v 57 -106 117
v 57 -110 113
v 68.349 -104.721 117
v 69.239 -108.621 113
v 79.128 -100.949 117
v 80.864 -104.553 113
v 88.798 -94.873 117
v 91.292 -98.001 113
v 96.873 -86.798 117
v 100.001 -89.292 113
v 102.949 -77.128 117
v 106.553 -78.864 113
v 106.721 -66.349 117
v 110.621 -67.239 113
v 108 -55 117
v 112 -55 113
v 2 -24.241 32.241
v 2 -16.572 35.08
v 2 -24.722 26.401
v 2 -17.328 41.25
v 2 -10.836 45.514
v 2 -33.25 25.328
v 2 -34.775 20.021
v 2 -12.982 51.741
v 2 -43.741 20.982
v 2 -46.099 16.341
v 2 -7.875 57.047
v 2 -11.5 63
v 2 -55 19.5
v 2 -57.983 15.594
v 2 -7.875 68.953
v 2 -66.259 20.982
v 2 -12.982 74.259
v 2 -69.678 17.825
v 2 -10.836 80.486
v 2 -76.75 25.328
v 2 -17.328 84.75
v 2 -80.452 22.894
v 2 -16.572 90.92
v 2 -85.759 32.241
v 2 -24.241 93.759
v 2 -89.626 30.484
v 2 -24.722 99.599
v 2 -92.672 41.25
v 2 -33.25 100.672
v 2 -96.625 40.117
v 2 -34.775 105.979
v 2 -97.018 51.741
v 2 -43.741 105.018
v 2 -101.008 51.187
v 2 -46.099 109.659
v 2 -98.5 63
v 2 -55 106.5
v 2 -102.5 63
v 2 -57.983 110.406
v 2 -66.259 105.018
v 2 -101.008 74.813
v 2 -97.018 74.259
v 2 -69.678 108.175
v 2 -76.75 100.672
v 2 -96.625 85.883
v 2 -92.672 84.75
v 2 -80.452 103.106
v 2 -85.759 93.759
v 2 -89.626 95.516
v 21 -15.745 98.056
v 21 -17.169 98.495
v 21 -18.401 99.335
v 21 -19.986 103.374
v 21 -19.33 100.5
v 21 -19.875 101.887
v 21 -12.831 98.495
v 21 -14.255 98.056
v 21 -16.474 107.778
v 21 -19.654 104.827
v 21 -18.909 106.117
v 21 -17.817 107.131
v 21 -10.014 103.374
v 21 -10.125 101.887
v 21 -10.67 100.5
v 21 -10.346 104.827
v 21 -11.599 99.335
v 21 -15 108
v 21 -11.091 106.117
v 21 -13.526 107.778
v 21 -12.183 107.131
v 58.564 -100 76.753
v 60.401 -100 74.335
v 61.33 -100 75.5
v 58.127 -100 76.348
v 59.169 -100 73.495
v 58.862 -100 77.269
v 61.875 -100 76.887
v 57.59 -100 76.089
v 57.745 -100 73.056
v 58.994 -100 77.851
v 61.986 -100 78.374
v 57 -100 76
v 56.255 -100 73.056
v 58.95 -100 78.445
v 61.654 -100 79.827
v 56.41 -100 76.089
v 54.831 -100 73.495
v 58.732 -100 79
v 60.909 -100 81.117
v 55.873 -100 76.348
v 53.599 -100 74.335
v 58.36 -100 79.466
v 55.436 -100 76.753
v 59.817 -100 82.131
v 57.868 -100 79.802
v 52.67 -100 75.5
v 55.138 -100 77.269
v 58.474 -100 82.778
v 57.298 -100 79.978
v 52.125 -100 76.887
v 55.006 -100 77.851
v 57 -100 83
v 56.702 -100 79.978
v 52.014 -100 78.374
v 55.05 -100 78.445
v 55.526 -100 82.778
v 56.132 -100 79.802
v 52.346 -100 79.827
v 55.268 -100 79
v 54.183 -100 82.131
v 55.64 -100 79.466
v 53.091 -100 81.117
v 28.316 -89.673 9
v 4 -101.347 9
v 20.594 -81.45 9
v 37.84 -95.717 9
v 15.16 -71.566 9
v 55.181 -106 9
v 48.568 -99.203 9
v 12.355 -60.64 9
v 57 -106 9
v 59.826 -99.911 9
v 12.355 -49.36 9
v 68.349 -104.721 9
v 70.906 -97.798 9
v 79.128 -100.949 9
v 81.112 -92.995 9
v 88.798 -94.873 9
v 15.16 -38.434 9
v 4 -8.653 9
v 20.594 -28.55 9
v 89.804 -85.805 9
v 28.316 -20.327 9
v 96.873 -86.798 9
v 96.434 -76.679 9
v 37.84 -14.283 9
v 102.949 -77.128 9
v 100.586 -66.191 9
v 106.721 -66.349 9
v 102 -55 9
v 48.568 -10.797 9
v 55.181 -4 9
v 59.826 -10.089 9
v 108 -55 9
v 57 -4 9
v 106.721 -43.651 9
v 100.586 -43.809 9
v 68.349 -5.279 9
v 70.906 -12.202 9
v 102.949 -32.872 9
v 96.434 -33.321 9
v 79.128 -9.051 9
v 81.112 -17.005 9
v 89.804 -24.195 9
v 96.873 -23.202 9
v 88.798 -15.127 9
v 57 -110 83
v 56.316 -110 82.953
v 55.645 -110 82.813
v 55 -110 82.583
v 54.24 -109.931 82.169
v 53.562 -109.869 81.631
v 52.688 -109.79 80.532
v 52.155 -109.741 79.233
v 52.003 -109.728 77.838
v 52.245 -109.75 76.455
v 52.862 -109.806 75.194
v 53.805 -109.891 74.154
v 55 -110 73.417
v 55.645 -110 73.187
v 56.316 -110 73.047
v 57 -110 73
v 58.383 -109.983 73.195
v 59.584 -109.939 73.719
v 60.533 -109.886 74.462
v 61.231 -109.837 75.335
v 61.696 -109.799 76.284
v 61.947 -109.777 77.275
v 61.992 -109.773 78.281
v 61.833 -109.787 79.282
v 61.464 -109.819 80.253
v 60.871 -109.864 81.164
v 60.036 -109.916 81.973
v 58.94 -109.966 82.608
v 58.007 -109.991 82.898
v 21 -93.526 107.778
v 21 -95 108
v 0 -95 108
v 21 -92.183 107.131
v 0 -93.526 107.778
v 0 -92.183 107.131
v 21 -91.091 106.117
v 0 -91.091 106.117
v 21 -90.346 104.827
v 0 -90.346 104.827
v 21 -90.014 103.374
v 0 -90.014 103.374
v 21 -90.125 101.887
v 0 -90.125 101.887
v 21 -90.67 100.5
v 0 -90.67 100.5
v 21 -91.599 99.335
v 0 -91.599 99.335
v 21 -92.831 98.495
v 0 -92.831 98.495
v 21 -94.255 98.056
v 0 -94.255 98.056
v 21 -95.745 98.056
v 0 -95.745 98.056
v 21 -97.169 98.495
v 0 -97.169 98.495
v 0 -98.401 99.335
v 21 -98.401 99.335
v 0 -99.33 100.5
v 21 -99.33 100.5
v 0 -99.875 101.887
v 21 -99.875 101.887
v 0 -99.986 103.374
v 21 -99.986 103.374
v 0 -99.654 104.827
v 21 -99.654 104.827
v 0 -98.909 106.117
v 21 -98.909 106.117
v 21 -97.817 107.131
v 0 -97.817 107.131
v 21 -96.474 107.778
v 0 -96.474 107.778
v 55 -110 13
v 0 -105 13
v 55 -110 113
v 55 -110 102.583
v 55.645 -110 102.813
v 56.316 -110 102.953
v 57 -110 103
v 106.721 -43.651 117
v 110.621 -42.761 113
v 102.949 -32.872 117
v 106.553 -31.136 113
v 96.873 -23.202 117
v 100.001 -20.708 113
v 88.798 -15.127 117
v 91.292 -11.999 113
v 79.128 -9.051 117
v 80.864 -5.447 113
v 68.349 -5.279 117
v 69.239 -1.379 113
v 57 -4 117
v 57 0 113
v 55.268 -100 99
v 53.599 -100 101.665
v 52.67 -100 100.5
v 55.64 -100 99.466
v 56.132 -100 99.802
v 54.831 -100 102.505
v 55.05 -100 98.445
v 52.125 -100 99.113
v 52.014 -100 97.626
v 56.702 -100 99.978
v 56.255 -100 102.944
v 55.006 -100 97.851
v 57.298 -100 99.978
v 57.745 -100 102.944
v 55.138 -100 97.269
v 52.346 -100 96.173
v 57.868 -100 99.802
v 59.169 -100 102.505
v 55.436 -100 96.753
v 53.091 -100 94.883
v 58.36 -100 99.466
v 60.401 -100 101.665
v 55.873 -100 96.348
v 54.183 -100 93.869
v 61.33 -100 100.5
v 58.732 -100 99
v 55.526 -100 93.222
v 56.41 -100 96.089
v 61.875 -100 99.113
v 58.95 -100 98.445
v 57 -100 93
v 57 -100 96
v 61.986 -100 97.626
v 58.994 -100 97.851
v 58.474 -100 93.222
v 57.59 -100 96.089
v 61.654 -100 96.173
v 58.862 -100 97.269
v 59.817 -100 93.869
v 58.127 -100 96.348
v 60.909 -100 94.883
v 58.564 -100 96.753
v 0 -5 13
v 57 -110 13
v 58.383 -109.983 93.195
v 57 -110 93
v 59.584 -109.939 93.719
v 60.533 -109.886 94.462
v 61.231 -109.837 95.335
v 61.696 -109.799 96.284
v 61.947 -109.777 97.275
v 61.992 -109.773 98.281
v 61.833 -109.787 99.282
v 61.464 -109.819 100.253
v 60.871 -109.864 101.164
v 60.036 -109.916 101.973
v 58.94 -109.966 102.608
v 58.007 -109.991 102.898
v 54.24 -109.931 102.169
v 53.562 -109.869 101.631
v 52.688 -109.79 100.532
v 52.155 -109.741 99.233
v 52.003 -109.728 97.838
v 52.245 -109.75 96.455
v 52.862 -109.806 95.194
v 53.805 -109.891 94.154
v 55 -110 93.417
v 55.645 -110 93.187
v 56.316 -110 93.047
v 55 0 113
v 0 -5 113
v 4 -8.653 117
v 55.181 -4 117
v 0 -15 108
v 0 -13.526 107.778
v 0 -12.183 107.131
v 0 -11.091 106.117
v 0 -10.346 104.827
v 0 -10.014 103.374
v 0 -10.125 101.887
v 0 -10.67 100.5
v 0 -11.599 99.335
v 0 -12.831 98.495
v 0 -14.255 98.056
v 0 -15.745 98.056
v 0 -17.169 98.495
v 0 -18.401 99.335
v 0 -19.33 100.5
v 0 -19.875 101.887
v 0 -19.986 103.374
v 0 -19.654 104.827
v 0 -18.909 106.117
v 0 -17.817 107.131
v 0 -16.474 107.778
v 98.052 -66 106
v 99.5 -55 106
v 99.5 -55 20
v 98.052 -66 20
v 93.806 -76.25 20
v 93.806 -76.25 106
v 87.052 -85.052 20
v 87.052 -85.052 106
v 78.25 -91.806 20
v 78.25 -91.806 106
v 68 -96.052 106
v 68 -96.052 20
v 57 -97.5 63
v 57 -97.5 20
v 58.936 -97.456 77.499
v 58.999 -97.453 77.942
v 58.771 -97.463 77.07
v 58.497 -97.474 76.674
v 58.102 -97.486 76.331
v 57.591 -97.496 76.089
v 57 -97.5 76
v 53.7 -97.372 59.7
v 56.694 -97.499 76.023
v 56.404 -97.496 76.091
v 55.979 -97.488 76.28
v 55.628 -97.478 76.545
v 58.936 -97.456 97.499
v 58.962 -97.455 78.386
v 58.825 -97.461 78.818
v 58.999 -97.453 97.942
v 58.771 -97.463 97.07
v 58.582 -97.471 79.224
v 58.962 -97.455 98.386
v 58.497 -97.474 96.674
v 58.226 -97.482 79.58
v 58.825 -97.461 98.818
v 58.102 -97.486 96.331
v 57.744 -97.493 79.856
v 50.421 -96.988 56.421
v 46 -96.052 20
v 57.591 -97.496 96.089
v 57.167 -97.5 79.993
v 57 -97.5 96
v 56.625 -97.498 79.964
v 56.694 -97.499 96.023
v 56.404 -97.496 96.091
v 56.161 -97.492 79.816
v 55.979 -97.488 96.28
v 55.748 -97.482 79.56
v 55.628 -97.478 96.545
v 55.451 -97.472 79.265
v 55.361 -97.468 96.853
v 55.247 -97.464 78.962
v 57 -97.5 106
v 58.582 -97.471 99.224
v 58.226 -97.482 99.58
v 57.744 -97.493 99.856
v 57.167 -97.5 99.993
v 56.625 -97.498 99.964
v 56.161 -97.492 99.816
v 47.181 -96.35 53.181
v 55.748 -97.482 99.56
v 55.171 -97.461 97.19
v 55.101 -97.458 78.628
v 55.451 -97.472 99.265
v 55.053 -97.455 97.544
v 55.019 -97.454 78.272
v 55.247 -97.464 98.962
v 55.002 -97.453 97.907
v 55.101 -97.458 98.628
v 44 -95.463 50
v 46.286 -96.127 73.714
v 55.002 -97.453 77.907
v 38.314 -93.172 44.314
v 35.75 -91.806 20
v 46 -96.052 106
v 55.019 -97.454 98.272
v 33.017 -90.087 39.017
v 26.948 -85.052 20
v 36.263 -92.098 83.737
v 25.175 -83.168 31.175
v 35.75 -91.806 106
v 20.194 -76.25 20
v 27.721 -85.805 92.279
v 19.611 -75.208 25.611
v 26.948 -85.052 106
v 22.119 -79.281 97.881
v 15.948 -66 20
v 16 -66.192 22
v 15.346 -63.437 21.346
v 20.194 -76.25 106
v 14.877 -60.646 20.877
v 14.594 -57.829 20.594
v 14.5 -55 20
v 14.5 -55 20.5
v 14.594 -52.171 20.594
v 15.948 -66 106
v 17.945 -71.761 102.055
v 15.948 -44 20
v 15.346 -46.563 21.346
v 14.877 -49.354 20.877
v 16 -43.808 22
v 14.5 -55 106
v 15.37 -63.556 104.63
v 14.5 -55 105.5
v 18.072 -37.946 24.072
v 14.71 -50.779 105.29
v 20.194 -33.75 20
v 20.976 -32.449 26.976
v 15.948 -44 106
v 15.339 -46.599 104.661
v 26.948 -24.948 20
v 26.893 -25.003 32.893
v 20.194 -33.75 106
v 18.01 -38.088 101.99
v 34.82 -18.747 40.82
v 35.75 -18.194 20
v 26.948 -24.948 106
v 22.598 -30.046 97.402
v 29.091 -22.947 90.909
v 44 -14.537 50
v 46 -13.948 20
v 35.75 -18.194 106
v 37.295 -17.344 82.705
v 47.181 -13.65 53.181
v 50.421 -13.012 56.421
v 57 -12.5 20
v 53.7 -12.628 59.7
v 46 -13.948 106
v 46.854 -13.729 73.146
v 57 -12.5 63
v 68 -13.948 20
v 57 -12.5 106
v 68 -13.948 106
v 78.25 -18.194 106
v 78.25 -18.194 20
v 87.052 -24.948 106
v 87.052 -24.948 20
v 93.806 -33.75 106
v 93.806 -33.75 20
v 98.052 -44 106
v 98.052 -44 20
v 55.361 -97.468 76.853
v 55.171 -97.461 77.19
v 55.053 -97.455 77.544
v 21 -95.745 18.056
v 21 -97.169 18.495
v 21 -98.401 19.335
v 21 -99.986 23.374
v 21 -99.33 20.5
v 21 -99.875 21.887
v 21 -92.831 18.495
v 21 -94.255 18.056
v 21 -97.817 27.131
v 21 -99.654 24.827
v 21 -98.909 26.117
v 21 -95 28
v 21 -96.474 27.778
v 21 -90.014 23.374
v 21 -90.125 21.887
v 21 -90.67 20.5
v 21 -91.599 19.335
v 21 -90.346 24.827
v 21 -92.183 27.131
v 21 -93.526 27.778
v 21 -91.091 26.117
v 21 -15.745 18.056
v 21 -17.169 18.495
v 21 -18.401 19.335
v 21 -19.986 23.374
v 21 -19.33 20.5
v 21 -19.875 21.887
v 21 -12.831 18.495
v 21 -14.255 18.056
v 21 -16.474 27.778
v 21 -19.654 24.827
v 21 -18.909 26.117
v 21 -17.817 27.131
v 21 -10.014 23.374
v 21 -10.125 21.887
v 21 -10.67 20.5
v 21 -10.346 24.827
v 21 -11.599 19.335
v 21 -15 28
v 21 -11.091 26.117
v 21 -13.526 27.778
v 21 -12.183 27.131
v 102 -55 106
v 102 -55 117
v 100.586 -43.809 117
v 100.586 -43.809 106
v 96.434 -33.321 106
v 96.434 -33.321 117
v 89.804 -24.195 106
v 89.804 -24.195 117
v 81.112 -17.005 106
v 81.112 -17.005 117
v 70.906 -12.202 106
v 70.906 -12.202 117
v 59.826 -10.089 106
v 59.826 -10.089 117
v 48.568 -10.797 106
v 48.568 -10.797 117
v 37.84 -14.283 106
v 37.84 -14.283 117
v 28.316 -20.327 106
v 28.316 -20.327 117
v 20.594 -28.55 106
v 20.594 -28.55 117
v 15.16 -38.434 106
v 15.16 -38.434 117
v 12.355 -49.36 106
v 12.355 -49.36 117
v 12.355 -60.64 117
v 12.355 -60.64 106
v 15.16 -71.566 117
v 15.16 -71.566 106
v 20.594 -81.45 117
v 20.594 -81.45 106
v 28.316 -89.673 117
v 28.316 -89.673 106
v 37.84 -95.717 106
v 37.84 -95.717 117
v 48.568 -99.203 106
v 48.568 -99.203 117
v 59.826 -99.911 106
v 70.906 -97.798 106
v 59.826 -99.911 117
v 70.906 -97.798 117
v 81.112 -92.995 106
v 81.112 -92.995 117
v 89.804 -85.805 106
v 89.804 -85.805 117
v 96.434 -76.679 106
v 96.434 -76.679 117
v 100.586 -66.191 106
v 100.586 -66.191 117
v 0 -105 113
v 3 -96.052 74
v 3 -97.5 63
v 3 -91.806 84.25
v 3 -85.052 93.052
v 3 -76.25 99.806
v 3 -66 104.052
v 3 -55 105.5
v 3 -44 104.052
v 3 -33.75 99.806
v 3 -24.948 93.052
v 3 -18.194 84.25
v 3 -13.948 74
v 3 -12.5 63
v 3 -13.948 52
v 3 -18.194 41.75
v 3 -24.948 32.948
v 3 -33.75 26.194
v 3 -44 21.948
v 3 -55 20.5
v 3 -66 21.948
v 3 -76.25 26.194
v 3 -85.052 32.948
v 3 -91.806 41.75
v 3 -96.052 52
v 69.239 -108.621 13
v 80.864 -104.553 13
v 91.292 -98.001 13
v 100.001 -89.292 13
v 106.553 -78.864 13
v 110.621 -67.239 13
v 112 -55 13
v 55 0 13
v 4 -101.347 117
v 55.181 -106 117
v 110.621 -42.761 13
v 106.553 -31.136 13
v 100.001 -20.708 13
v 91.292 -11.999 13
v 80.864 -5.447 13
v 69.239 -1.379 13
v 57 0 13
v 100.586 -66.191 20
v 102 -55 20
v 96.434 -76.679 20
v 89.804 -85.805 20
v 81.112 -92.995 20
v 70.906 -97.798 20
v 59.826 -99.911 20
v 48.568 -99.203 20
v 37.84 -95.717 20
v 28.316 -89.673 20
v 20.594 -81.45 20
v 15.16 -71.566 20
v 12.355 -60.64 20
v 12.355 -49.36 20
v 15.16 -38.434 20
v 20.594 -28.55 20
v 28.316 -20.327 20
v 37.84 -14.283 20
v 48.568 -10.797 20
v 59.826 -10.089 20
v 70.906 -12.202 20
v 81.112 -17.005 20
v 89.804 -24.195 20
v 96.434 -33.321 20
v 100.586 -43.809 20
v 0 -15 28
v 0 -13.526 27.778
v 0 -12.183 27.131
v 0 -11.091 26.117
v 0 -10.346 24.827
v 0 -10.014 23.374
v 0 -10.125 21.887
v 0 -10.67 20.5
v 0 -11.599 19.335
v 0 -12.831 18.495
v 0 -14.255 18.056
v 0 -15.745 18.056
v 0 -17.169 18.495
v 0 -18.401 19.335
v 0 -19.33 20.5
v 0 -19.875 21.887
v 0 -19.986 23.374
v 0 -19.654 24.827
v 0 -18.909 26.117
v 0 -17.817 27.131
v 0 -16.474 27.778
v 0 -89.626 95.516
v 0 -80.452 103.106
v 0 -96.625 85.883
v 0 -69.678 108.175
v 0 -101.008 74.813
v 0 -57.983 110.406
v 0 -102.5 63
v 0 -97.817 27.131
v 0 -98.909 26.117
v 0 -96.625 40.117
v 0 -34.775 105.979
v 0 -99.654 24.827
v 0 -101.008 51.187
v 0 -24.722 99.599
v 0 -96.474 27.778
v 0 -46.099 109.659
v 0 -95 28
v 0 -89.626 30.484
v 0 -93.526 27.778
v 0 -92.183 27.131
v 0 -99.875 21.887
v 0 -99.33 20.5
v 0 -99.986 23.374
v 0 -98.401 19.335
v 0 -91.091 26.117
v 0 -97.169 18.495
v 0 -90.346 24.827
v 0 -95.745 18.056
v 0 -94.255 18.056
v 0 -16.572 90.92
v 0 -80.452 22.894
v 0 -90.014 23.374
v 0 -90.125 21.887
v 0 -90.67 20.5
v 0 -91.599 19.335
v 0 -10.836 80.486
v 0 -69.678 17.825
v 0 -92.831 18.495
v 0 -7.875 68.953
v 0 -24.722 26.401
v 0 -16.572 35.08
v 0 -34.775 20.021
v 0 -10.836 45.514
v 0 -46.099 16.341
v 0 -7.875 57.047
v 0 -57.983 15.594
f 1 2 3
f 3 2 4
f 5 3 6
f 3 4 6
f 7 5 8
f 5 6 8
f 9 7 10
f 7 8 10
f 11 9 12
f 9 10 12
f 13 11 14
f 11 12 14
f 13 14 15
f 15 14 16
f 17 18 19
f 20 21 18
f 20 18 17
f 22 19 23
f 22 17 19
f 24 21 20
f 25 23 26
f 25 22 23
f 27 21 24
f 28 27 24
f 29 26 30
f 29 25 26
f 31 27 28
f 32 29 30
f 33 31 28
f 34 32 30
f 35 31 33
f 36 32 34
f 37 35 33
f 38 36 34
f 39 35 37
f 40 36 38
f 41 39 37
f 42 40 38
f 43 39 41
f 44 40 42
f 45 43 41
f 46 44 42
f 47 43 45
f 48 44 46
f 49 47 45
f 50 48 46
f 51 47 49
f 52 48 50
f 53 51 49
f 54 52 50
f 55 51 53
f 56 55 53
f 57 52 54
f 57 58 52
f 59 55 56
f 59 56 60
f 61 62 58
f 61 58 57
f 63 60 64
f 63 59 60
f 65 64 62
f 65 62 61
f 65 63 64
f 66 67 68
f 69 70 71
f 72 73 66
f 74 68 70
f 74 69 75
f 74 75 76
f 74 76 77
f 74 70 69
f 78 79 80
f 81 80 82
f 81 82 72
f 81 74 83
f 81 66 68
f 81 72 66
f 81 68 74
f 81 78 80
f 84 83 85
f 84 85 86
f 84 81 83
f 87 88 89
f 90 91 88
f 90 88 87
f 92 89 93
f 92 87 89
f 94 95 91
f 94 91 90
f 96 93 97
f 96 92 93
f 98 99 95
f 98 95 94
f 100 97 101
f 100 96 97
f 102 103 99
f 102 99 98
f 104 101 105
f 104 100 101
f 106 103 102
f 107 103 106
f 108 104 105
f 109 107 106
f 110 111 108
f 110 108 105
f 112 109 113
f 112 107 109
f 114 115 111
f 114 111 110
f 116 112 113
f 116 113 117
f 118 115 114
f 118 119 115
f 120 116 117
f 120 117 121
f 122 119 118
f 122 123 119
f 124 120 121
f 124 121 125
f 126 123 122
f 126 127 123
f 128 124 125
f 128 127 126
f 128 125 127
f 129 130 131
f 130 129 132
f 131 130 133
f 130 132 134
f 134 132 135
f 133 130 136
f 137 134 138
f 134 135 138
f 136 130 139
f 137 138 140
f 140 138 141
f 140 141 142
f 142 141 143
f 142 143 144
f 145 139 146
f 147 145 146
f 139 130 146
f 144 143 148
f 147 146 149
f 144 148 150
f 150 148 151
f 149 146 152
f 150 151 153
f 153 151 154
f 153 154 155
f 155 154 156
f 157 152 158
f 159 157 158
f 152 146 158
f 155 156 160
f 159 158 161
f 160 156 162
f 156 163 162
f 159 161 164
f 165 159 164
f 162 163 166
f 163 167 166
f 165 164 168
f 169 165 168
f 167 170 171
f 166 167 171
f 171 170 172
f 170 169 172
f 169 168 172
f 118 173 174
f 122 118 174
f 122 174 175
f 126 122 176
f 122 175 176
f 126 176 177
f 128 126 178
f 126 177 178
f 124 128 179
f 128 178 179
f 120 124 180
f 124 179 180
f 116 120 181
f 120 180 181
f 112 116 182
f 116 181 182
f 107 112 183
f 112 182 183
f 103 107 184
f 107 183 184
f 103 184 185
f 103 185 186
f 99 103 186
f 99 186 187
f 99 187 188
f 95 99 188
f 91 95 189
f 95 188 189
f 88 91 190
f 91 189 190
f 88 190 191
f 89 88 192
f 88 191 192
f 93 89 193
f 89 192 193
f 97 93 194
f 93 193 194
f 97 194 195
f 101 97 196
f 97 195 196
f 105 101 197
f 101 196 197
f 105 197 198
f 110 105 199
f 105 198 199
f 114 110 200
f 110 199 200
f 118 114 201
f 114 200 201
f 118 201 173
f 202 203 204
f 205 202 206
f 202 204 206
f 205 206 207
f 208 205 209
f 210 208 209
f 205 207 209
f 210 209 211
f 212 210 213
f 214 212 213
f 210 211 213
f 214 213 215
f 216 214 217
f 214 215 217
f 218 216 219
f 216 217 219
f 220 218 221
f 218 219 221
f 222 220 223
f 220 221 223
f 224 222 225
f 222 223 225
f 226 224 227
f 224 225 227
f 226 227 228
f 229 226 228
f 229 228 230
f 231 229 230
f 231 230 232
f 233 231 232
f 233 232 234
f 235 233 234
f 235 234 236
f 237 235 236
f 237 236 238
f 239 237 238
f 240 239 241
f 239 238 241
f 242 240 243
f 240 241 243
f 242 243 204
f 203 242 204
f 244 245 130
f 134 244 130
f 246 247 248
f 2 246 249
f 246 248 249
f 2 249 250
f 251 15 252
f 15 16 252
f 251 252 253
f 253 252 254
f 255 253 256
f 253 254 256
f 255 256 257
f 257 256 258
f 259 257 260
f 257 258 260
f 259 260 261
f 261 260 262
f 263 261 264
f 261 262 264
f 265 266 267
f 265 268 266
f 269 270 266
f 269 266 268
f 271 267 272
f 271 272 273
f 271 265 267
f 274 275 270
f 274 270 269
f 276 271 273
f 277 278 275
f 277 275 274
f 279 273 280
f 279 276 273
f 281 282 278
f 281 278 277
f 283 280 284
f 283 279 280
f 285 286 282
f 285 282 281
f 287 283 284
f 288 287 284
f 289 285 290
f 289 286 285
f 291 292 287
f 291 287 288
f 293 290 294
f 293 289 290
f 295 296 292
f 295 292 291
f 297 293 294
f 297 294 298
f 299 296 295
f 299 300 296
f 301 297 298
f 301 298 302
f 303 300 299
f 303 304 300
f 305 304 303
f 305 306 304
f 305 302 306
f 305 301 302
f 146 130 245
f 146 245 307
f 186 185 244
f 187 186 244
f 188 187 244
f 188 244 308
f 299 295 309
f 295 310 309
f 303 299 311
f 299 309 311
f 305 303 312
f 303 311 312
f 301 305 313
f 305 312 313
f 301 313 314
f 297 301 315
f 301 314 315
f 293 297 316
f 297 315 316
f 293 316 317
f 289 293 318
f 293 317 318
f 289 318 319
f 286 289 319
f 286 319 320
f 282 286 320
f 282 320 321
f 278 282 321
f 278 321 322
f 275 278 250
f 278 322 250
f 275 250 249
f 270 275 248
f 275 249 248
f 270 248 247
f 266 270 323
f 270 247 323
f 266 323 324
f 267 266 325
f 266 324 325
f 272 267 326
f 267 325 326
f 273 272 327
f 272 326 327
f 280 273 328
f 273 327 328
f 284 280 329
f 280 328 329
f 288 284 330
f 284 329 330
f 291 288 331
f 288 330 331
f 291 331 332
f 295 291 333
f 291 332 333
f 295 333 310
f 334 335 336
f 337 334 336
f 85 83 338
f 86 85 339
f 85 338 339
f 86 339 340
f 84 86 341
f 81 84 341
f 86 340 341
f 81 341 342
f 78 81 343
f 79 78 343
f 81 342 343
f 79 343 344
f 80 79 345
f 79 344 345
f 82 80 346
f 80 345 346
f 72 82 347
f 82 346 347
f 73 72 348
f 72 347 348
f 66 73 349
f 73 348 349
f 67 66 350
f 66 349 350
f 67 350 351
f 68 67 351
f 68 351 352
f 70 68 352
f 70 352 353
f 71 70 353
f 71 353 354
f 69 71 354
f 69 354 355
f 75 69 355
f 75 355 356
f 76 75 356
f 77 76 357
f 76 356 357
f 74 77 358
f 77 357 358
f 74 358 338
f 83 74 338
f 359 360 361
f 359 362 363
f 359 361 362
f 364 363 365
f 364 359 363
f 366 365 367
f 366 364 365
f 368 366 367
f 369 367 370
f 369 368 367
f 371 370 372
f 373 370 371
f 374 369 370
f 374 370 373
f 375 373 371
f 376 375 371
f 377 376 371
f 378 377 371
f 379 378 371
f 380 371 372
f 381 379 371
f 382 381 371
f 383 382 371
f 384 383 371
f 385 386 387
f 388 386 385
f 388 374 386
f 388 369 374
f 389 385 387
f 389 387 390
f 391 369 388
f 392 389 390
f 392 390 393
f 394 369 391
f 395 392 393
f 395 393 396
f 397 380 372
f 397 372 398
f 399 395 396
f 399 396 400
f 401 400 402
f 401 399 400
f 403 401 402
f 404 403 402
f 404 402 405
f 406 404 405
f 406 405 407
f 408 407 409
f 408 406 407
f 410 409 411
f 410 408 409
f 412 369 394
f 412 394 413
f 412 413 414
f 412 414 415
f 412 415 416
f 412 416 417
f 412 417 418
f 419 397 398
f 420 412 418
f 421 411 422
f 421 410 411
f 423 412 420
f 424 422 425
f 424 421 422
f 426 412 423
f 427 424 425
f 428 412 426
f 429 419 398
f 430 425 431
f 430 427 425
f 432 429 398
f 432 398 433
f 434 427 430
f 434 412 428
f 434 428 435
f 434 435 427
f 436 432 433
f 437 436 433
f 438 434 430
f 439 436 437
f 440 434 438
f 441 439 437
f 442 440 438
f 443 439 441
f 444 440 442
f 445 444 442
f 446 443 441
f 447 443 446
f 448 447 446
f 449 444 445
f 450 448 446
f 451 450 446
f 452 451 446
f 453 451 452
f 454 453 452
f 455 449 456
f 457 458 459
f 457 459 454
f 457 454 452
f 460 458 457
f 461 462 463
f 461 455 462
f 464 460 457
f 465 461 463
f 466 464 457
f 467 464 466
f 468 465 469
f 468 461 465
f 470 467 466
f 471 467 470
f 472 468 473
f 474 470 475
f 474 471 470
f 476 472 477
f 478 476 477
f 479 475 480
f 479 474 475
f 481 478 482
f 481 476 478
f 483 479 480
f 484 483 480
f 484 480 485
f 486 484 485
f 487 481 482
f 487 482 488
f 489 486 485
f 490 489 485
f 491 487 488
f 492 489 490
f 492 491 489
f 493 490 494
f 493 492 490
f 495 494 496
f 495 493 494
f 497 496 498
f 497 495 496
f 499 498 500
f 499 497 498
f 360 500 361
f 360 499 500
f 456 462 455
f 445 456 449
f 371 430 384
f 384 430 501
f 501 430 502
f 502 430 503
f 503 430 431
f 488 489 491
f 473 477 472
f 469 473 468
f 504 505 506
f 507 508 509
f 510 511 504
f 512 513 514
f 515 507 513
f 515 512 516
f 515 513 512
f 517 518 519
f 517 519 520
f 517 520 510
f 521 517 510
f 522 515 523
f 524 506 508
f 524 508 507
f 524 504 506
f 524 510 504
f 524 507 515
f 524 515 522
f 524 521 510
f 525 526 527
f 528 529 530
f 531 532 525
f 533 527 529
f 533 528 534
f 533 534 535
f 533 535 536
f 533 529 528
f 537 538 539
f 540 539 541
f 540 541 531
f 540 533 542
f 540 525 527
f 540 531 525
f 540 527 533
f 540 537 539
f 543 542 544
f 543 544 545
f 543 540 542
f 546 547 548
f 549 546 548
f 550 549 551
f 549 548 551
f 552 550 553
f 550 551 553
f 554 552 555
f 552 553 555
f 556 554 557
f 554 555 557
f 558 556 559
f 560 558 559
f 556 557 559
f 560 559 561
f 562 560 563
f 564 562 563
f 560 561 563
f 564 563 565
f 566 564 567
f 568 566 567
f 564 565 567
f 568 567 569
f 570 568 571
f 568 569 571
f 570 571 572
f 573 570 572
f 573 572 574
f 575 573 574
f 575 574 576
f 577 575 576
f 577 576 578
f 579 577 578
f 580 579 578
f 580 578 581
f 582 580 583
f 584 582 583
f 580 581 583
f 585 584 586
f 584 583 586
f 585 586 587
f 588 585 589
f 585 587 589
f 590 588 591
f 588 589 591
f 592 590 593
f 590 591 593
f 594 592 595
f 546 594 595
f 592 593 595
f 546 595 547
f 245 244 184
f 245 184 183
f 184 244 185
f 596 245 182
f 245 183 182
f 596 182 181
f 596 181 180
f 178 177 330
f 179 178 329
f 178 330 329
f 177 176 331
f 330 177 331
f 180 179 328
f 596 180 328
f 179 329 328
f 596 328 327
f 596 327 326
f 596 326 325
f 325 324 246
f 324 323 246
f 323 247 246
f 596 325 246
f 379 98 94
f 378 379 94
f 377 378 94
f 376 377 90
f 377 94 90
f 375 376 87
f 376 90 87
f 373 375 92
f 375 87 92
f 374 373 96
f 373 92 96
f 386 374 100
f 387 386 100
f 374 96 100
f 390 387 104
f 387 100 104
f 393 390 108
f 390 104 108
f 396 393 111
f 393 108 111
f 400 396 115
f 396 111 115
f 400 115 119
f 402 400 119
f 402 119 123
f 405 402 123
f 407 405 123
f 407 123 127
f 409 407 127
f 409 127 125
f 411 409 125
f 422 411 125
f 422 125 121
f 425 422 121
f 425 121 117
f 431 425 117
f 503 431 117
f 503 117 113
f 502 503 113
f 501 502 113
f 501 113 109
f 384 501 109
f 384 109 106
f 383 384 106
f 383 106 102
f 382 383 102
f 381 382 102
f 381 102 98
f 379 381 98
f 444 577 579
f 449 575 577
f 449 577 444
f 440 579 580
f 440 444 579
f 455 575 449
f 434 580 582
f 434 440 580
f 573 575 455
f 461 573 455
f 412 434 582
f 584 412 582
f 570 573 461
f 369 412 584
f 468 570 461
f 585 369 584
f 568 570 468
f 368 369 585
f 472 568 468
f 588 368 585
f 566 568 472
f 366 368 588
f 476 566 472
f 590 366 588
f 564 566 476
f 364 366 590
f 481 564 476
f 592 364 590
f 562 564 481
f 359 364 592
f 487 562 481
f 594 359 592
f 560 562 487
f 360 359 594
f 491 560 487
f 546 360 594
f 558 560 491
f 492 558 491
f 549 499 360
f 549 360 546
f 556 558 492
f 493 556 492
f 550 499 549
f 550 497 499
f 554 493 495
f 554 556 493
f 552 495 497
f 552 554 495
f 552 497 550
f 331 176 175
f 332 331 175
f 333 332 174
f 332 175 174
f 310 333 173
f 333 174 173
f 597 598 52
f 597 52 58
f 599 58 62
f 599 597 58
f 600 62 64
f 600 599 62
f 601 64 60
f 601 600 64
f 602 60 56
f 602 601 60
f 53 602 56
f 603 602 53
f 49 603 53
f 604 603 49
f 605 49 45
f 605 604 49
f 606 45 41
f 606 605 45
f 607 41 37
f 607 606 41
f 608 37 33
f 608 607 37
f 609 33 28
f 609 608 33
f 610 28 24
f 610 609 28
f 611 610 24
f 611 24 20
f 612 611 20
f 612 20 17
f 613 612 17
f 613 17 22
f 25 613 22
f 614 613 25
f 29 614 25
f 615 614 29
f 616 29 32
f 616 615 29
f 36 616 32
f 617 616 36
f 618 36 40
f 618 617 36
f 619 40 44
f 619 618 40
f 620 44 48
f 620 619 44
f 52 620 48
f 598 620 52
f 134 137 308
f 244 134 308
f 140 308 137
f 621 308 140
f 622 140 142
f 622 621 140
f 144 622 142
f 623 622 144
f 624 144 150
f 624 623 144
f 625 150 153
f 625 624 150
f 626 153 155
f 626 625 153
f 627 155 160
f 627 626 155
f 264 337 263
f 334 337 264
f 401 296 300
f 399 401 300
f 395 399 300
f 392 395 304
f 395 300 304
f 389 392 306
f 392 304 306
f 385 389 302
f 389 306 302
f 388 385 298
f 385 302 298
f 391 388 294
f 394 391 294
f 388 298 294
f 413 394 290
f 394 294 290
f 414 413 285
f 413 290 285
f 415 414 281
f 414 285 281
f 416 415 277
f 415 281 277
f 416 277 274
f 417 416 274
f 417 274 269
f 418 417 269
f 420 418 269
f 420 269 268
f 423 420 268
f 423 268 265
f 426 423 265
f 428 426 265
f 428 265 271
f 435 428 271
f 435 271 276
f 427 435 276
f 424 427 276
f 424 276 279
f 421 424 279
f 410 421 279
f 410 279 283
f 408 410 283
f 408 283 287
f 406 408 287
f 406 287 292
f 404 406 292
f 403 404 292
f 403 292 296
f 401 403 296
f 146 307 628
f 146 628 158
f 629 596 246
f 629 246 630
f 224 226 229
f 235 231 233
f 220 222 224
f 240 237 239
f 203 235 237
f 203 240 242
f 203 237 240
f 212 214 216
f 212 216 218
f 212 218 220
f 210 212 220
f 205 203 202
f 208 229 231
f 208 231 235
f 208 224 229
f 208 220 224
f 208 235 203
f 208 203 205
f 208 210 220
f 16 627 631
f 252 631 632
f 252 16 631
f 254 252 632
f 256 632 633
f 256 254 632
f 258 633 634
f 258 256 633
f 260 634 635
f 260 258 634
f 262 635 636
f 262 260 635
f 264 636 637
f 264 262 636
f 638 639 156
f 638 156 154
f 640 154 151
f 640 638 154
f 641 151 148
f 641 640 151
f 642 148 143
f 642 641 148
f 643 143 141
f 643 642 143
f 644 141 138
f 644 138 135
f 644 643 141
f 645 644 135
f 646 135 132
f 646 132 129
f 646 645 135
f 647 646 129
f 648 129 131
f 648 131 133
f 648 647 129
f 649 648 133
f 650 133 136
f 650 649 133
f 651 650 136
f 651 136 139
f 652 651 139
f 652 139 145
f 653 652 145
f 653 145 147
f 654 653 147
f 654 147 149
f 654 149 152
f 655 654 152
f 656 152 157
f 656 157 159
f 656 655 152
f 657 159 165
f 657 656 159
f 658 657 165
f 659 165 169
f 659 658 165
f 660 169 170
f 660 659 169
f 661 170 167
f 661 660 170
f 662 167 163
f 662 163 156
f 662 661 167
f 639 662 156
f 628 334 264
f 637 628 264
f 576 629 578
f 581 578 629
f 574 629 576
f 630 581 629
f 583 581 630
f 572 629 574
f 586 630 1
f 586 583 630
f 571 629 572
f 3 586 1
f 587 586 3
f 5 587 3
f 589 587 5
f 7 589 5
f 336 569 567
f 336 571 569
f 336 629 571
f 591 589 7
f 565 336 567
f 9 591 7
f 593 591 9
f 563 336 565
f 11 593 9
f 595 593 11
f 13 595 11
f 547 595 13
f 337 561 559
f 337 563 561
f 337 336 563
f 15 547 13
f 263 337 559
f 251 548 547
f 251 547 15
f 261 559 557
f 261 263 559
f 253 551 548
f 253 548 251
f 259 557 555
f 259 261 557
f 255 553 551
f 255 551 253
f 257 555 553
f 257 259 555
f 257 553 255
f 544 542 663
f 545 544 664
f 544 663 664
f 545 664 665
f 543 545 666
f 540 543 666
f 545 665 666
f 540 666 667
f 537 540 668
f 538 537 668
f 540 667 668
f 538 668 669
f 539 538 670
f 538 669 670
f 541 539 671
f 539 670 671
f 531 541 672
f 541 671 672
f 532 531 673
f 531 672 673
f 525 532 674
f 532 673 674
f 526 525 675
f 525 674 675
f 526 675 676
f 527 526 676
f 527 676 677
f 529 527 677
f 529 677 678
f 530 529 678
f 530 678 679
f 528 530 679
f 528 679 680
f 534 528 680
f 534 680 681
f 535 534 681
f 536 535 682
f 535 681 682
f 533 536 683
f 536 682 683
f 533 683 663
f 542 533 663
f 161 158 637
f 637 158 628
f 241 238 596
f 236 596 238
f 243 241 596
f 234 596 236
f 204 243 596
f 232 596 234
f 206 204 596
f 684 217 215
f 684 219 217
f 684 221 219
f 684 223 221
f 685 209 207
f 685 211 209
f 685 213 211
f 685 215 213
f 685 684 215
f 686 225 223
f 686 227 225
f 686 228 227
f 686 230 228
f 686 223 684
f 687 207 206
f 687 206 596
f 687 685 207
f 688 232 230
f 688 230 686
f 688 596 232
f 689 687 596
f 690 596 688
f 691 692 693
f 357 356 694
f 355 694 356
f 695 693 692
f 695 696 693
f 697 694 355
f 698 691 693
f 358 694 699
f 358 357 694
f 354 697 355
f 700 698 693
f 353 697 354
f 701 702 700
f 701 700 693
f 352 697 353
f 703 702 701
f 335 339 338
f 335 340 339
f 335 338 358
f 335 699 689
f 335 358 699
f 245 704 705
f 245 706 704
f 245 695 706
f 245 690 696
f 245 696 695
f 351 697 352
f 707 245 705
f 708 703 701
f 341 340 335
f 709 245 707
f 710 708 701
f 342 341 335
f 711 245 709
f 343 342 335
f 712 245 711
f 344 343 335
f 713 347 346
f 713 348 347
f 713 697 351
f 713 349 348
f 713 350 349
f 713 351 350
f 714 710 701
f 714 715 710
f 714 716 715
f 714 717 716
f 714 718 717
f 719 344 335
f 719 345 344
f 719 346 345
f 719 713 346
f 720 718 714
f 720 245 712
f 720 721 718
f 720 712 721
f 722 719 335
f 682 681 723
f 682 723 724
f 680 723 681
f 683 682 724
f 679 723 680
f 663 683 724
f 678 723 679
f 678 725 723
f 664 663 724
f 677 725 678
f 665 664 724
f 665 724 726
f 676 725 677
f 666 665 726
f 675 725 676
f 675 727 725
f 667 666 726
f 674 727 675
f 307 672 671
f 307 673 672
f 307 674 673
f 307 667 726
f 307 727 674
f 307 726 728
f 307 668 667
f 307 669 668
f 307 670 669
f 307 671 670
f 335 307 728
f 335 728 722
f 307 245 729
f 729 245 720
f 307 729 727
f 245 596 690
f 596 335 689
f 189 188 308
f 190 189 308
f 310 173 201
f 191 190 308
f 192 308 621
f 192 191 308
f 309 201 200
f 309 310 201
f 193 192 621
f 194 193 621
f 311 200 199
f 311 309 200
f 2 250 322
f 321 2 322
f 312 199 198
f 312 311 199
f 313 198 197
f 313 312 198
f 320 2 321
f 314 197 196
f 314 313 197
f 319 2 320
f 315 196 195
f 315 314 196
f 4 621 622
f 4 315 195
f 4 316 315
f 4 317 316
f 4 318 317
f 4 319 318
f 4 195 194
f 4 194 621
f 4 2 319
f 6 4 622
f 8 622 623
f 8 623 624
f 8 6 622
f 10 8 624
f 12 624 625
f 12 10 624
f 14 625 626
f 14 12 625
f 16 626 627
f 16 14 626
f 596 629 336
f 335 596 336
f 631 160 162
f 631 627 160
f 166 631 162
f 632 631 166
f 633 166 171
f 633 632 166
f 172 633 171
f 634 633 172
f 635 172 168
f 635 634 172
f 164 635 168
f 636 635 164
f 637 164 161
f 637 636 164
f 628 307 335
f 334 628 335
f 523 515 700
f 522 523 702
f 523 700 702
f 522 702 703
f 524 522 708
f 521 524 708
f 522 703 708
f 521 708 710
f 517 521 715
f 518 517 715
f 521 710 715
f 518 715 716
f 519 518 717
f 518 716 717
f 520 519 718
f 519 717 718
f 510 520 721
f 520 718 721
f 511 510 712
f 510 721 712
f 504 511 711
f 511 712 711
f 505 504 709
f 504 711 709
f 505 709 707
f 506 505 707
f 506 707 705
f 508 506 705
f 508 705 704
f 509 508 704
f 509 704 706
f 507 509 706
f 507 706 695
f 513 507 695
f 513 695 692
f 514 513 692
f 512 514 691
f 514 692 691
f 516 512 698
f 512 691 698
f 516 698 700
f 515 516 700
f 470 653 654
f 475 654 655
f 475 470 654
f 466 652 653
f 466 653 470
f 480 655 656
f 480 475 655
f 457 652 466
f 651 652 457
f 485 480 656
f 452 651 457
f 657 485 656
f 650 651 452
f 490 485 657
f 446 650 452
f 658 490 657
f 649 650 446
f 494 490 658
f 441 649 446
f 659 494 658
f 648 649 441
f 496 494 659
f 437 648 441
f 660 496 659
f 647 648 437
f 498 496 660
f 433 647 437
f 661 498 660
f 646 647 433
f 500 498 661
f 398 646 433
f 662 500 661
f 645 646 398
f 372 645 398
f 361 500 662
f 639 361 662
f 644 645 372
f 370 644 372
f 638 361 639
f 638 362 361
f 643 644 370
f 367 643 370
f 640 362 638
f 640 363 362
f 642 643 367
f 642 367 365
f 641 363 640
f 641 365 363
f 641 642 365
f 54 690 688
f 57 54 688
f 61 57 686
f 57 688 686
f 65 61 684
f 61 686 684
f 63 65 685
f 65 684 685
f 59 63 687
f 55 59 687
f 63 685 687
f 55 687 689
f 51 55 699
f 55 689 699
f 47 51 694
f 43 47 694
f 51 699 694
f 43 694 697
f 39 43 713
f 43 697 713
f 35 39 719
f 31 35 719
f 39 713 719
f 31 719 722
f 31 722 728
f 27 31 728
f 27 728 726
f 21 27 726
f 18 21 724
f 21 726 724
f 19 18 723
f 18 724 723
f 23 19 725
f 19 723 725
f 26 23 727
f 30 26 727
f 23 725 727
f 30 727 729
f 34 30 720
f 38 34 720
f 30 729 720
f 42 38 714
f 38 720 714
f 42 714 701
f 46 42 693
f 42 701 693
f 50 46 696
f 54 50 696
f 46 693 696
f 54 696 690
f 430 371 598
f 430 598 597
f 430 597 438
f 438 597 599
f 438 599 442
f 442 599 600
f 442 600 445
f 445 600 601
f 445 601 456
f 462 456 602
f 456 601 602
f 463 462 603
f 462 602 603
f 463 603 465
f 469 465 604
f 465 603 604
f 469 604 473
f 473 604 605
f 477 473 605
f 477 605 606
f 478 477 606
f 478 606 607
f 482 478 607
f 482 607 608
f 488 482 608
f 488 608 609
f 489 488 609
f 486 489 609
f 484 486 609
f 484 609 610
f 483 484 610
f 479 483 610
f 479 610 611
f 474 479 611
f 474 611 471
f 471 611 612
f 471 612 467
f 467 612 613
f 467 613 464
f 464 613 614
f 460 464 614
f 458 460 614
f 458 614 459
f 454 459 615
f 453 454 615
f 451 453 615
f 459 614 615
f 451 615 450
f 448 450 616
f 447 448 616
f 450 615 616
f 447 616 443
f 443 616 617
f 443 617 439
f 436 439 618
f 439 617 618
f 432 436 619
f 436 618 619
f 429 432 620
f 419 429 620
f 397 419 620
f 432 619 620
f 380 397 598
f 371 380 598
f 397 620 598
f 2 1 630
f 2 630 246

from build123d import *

# Parameters (mm, degrees)
SKETCH_1_W           = 112
SKETCH_1_H           = 110
EXTRUDE_1_DEPTH      = 126
FILLET_1_R           = 55
SKETCH_9_R           = 42.5
CUT_EXTRUDE_5_DEPTH  = 104
SKETCH_10_R          = 42.5
CUT_EXTRUDE_6_DEPTH  = 57
CUT_EXTRUDE_START    = -50
SKETCH_11_R          = 42.5
CUT_EXTRUDE_7_DEPTH  = 50
CHAMFER_1_SIZE       = 55
CHAMFER_1_SIZE2      = 5
CHAMFER_2_SIZE       = 5
CHAMFER_2_SIZE2      = 55
SKETCH_14_W          = 143.089430894
SKETCH_14_H          = 9
CUT_EXTRUDE_8_DEPTH  = 202.295802241
CHAMFER_5_SIZE       = 4
CHAMFER_6_SIZE       = 4
SKETCH_18_R          = 5
CUT_EXTRUDE_9_DEPTH  = 21
SKETCH_19_R          = 45
CUT_EXTRUDE_10_DEPTH = 11
CUT_EXTRUDE_START_2  = -11
SKETCH_20_R          = 45
CUT_EXTRUDE_11_DEPTH = 11
CHAMFER_7_SIZE       = 4
SKETCH_17_R          = 47.5
SKETCH_17_R_2        = 42.5
CUT_EXTRUDE_12_DEPTH = 2
CHAMFER_8_SIZE       = 1
SKETCH_21_R          = 5
CUT_EXTRUDE_13_DEPTH = 10
SKETCH_22_R          = 2
CUT_EXTRUDE_14_DEPTH = 10


# Some blends are built 0.0001 mm under size
with BuildPart() as part:
    # 草图1 → 拉伸1 (new body)
    with BuildSketch(Plane.XY):
        with Locations((56, -55)):
            Rectangle(SKETCH_1_W, SKETCH_1_H)
    extrude(amount=EXTRUDE_1_DEPTH)

    # 圆角1
    fillet_1_edges = [part.edges().sort_by_distance(p)[0] for p in [
        (112, -110, 63),
        (112, 0, 63),
    ]]
    fillet(fillet_1_edges, radius=FILLET_1_R - 0.0001)  # a hair under: the kernel refuses the full size

    # 草图9 → 切除-拉伸5 (cut)
    with BuildSketch(Plane.XY.offset(126)):
        with Locations((57, -55)):
            Circle(SKETCH_9_R)
    extrude(amount=-CUT_EXTRUDE_5_DEPTH, mode=Mode.SUBTRACT)

    # 草图10 → 切除-拉伸6 (cut)
    with BuildSketch(Plane.ZY):
        with Locations(Location((63, -55, 0), (0, 0, 270))):
            Circle(SKETCH_10_R)
    extrude(amount=-CUT_EXTRUDE_6_DEPTH, mode=Mode.SUBTRACT)

    # 草图11 → 切除-拉伸7 (cut)
    with BuildSketch(Plane(origin=(0, 0, 0), x_dir=(-1, 0, 0), z_dir=(0, 0, -1)).offset(CUT_EXTRUDE_START)):
        with Locations(Location((-57, -55, 0), (0, 0, 180))):
            Circle(SKETCH_11_R)
    extrude(amount=CUT_EXTRUDE_7_DEPTH, mode=Mode.SUBTRACT)

    # 倒角1
    chamfer_1_edges = [part.edges().sort_by_distance(p)[0] for p in [
        (0, 0, 63),
    ]]
    chamfer_1_side = [part.faces().sort_by_distance(p)[0] for p in [
        (28.50005, 0, 63),
    ]]
    chamfer(chamfer_1_edges, length=CHAMFER_1_SIZE, length2=CHAMFER_1_SIZE2, reference=chamfer_1_side[0])

    # 倒角2
    chamfer_2_edges = [part.edges().sort_by_distance(p)[0] for p in [
        (0, -110, 63),
    ]]
    chamfer_2_side = [part.faces().sort_by_distance(p)[0] for p in [
        (0, -57.5, 1.640152432),
    ]]
    chamfer(chamfer_2_edges, length=CHAMFER_2_SIZE, length2=CHAMFER_2_SIZE2, reference=chamfer_2_side[0])

    # 草图14 → 切除-拉伸8 (cut, through all)
    with BuildSketch(Plane(origin=(0, 0, 0), x_dir=(1, 0, 0), z_dir=(0, 1, 0))):
        with Locations((58.317073171, -4.5)):
            Rectangle(SKETCH_14_W, SKETCH_14_H)
        with Locations((58.317073171, -121.5)):
            Rectangle(SKETCH_14_W, SKETCH_14_H)
    extrude(amount=-CUT_EXTRUDE_8_DEPTH, mode=Mode.SUBTRACT)

    # 倒角5
    chamfer_5_edges = [part.edges().sort_by_distance(p)[0] for p in [
        (0, -55, 117),
    ]]
    chamfer(chamfer_5_edges, length=CHAMFER_5_SIZE)

    # 倒角6
    chamfer_6_edges = [part.edges().sort_by_distance(p)[0] for p in [
        (0, -55, 9),
    ]]
    chamfer(chamfer_6_edges, length=CHAMFER_6_SIZE)

    # 草图18 → 切除-拉伸9 (cut)
    with BuildSketch(Plane.ZY):
        with Locations((23, -15)):
            Circle(SKETCH_18_R)
        with Locations((103, -15)):
            Circle(SKETCH_18_R)
        with Locations((23, -95)):
            Circle(SKETCH_18_R)
        with Locations((103, -95)):
            Circle(SKETCH_18_R)
    extrude(amount=-CUT_EXTRUDE_9_DEPTH, mode=Mode.SUBTRACT)

    # 草图19 → 切除-拉伸10 (cut)
    with BuildSketch(Plane.XY.offset(117)):
        with Locations((57, -55)):
            Circle(SKETCH_19_R)
    extrude(amount=-CUT_EXTRUDE_10_DEPTH, mode=Mode.SUBTRACT)

    # 草图20 → 切除-拉伸11 (cut)
    with BuildSketch(Plane(origin=(0, 0, 9), x_dir=(-1, 0, 0), z_dir=(0, 0, -1)).offset(CUT_EXTRUDE_START_2)):
        with Locations(Location((-57, -55, 0), (0, 0, 180))):
            Circle(SKETCH_20_R)
    extrude(amount=CUT_EXTRUDE_11_DEPTH, mode=Mode.SUBTRACT)

    # 倒角7
    # the kernel refuses this chamfer: 4 mm, written as the material it takes off along each edge
    with BuildSketch(Plane(origin=(-6.244486468, -104.432319412, 117), x_dir=(-0.002489359702032544, -0.027382956722357982, -0.9996219169112968), z_dir=(0.9958932064677039, -0.09053574604251853, 0)), Plane(origin=(65.244486468, 0.931316952, 117), x_dir=(-0.002489359702032457, 0.027382956722357025, -0.9996219169112968), z_dir=(-0.9958932064677039, -0.09053574604251853, 0))) as chamfer_7_piece_1:
        Polygon((CHAMFER_7_SIZE * 0.999621916911, CHAMFER_7_SIZE * 0.0274958766106), (-CHAMFER_7_SIZE * 0.0274958766106, CHAMFER_7_SIZE * 0.999621916911), (0, 0), align=None)
    extrude(amount=71.783774074, mode=Mode.SUBTRACT)
    with BuildSketch(Plane(origin=(57.0001, -110, 117), x_dir=(0, 0.9996219169112968, 0.027495876610585647), z_dir=(-1, 0, 0)), Plane(origin=(44.713268048, 0, 117), x_dir=(0, -0.9996219169112968, 0.02749587661058563), z_dir=(1, 0, 0))) as chamfer_7_piece_2:
        Polygon((CHAMFER_7_SIZE * 0.999621916911, CHAMFER_7_SIZE * 0.0274958766106), (-CHAMFER_7_SIZE * 0.0274958766106, CHAMFER_7_SIZE * 0.999621916911), (0, 0), align=None)
    extrude(amount=12.286831952, mode=Mode.SUBTRACT)
    with BuildSketch(Plane(origin=(57.0001, -55.0001, 117), x_dir=(0, -1, 0), z_dir=(-1, 0, 0))) as chamfer_7_piece_3:
        Polygon((54.9999 - CHAMFER_7_SIZE, 0), (54.9999, -CHAMFER_7_SIZE), (54.9999, 0), align=None)
    revolve(axis=Axis((57.0001, -55.0001, 117), (0, 0, 1)), revolution_arc=90, mode=Mode.SUBTRACT)
    with BuildSketch(Plane(origin=(57.0001, -54.9999, 117), x_dir=(1, 0, 0), z_dir=(0, -1, 0))) as chamfer_7_piece_4:
        Polygon((54.9999 - CHAMFER_7_SIZE, 0), (54.9999, -CHAMFER_7_SIZE), (54.9999, 0), align=None)
    revolve(axis=Axis((57.0001, -54.9999, 117), (0, 0, 1)), revolution_arc=90, mode=Mode.SUBTRACT)
    with BuildSketch(Plane(origin=(-6.244486468, -104.432319412, 9), x_dir=(-0.002489359702032431, -0.027382956722357972, 0.9996219169112968), z_dir=(0.9958932064677039, -0.09053574604251853, 0)), Plane(origin=(65.244486468, 0.931316952, 9), x_dir=(-0.0024893597020323437, 0.02738295672235701, 0.9996219169112968), z_dir=(-0.9958932064677039, -0.09053574604251853, 0))) as chamfer_7_piece_5:
        Polygon((CHAMFER_7_SIZE * 0.999621916911, -CHAMFER_7_SIZE * 0.0274958766106), (-CHAMFER_7_SIZE * 0.0274958766106, -CHAMFER_7_SIZE * 0.999621916911), (0, 0), align=None)
    extrude(amount=71.783774074, mode=Mode.SUBTRACT)
    with BuildSketch(Plane(origin=(44.713268048, 0, 9), x_dir=(0, -0.9996219169112968, -0.027495876610586494), z_dir=(1, 0, 0)), Plane(origin=(57.0001, -110, 9), x_dir=(0, 0.9996219169112968, -0.02749587661058651), z_dir=(-1, 0, 0))) as chamfer_7_piece_6:
        Polygon((CHAMFER_7_SIZE * 0.999621916911, -CHAMFER_7_SIZE * 0.0274958766106), (-CHAMFER_7_SIZE * 0.0274958766106, -CHAMFER_7_SIZE * 0.999621916911), (0, 0), align=None)
    extrude(amount=12.286831952, mode=Mode.SUBTRACT)
    with BuildSketch(Plane(origin=(57.0001, -54.9999, 9), x_dir=(1, 0, 0), z_dir=(0, -1, 0))) as chamfer_7_piece_7:
        Polygon((54.9999 - CHAMFER_7_SIZE, 0), (54.9999, CHAMFER_7_SIZE), (54.9999, 0), align=None)
    revolve(axis=Axis((57.0001, -54.9999, 9), (0, 0, 1)), revolution_arc=90, mode=Mode.SUBTRACT)
    with BuildSketch(Plane(origin=(57.0001, -55.0001, 9), x_dir=(0, -1, 0), z_dir=(-1, 0, 0))) as chamfer_7_piece_8:
        Polygon((54.9999 - CHAMFER_7_SIZE, 0), (54.9999, CHAMFER_7_SIZE), (54.9999, 0), align=None)
    revolve(axis=Axis((57.0001, -55.0001, 9), (0, 0, 1)), revolution_arc=90, mode=Mode.SUBTRACT)
    with BuildSketch(Plane(origin=(112, -54.9999, 9), x_dir=(-0.9996219169112968, 0, -0.02749587661058651), z_dir=(0, -1, 0))) as chamfer_7_piece_9:
        Polygon((CHAMFER_7_SIZE * 0.999621916911, -CHAMFER_7_SIZE * 0.0274958766106), (-CHAMFER_7_SIZE * 0.0274958766106, -CHAMFER_7_SIZE * 0.999621916911), (0, 0), align=None)
    extrude(amount=0.0002, mode=Mode.SUBTRACT)
    with BuildSketch(Plane(origin=(112, -54.9999, 117), x_dir=(-0.9996219169112968, 0, 0.027495876610585647), z_dir=(0, -1, 0))) as chamfer_7_piece_10:
        Polygon((CHAMFER_7_SIZE * 0.999621916911, CHAMFER_7_SIZE * 0.0274958766106), (-CHAMFER_7_SIZE * 0.0274958766106, CHAMFER_7_SIZE * 0.999621916911), (0, 0), align=None)
    extrude(amount=0.0002, mode=Mode.SUBTRACT)

    # 草图17 → 切除-拉伸12 (cut)
    with BuildSketch(Plane.ZY):
        with Locations(Location((63, -55, 0), (0, 0, 270))):
            Circle(SKETCH_17_R)
        with Locations(Location((63, -55, 0), (0, 0, 270))):
            Circle(SKETCH_17_R_2, mode=Mode.SUBTRACT)
    extrude(amount=-CUT_EXTRUDE_12_DEPTH, mode=Mode.SUBTRACT)

    # 倒角8
    chamfer_8_edges = [part.edges().sort_by_distance(p)[0] for p in [
        (2, -12.5, 63),
    ]]
    chamfer(chamfer_8_edges, length=CHAMFER_8_SIZE)

    # 草图21 → 切除-拉伸13 (cut)
    with BuildSketch(Plane.XZ.offset(110)):
        with Locations(Location((57, 98, 0), (0, 0, 270))):
            Circle(SKETCH_21_R)
        with Locations(Location((57, 78, 0), (0, 0, 90))):
            Circle(SKETCH_21_R)
    extrude(amount=-CUT_EXTRUDE_13_DEPTH, mode=Mode.SUBTRACT)

    # 草图22 → 切除-拉伸14 (cut)
    with BuildSketch(Plane.XZ.offset(100)):
        with Locations(Location((57, 78, 0), (0, 0, 270))):
            Circle(SKETCH_22_R)
        with Locations(Location((57, 98, 0), (0, 0, 270))):
            Circle(SKETCH_22_R)
    extrude(amount=-CUT_EXTRUDE_14_DEPTH, mode=Mode.SUBTRACT)


solid = part.part
